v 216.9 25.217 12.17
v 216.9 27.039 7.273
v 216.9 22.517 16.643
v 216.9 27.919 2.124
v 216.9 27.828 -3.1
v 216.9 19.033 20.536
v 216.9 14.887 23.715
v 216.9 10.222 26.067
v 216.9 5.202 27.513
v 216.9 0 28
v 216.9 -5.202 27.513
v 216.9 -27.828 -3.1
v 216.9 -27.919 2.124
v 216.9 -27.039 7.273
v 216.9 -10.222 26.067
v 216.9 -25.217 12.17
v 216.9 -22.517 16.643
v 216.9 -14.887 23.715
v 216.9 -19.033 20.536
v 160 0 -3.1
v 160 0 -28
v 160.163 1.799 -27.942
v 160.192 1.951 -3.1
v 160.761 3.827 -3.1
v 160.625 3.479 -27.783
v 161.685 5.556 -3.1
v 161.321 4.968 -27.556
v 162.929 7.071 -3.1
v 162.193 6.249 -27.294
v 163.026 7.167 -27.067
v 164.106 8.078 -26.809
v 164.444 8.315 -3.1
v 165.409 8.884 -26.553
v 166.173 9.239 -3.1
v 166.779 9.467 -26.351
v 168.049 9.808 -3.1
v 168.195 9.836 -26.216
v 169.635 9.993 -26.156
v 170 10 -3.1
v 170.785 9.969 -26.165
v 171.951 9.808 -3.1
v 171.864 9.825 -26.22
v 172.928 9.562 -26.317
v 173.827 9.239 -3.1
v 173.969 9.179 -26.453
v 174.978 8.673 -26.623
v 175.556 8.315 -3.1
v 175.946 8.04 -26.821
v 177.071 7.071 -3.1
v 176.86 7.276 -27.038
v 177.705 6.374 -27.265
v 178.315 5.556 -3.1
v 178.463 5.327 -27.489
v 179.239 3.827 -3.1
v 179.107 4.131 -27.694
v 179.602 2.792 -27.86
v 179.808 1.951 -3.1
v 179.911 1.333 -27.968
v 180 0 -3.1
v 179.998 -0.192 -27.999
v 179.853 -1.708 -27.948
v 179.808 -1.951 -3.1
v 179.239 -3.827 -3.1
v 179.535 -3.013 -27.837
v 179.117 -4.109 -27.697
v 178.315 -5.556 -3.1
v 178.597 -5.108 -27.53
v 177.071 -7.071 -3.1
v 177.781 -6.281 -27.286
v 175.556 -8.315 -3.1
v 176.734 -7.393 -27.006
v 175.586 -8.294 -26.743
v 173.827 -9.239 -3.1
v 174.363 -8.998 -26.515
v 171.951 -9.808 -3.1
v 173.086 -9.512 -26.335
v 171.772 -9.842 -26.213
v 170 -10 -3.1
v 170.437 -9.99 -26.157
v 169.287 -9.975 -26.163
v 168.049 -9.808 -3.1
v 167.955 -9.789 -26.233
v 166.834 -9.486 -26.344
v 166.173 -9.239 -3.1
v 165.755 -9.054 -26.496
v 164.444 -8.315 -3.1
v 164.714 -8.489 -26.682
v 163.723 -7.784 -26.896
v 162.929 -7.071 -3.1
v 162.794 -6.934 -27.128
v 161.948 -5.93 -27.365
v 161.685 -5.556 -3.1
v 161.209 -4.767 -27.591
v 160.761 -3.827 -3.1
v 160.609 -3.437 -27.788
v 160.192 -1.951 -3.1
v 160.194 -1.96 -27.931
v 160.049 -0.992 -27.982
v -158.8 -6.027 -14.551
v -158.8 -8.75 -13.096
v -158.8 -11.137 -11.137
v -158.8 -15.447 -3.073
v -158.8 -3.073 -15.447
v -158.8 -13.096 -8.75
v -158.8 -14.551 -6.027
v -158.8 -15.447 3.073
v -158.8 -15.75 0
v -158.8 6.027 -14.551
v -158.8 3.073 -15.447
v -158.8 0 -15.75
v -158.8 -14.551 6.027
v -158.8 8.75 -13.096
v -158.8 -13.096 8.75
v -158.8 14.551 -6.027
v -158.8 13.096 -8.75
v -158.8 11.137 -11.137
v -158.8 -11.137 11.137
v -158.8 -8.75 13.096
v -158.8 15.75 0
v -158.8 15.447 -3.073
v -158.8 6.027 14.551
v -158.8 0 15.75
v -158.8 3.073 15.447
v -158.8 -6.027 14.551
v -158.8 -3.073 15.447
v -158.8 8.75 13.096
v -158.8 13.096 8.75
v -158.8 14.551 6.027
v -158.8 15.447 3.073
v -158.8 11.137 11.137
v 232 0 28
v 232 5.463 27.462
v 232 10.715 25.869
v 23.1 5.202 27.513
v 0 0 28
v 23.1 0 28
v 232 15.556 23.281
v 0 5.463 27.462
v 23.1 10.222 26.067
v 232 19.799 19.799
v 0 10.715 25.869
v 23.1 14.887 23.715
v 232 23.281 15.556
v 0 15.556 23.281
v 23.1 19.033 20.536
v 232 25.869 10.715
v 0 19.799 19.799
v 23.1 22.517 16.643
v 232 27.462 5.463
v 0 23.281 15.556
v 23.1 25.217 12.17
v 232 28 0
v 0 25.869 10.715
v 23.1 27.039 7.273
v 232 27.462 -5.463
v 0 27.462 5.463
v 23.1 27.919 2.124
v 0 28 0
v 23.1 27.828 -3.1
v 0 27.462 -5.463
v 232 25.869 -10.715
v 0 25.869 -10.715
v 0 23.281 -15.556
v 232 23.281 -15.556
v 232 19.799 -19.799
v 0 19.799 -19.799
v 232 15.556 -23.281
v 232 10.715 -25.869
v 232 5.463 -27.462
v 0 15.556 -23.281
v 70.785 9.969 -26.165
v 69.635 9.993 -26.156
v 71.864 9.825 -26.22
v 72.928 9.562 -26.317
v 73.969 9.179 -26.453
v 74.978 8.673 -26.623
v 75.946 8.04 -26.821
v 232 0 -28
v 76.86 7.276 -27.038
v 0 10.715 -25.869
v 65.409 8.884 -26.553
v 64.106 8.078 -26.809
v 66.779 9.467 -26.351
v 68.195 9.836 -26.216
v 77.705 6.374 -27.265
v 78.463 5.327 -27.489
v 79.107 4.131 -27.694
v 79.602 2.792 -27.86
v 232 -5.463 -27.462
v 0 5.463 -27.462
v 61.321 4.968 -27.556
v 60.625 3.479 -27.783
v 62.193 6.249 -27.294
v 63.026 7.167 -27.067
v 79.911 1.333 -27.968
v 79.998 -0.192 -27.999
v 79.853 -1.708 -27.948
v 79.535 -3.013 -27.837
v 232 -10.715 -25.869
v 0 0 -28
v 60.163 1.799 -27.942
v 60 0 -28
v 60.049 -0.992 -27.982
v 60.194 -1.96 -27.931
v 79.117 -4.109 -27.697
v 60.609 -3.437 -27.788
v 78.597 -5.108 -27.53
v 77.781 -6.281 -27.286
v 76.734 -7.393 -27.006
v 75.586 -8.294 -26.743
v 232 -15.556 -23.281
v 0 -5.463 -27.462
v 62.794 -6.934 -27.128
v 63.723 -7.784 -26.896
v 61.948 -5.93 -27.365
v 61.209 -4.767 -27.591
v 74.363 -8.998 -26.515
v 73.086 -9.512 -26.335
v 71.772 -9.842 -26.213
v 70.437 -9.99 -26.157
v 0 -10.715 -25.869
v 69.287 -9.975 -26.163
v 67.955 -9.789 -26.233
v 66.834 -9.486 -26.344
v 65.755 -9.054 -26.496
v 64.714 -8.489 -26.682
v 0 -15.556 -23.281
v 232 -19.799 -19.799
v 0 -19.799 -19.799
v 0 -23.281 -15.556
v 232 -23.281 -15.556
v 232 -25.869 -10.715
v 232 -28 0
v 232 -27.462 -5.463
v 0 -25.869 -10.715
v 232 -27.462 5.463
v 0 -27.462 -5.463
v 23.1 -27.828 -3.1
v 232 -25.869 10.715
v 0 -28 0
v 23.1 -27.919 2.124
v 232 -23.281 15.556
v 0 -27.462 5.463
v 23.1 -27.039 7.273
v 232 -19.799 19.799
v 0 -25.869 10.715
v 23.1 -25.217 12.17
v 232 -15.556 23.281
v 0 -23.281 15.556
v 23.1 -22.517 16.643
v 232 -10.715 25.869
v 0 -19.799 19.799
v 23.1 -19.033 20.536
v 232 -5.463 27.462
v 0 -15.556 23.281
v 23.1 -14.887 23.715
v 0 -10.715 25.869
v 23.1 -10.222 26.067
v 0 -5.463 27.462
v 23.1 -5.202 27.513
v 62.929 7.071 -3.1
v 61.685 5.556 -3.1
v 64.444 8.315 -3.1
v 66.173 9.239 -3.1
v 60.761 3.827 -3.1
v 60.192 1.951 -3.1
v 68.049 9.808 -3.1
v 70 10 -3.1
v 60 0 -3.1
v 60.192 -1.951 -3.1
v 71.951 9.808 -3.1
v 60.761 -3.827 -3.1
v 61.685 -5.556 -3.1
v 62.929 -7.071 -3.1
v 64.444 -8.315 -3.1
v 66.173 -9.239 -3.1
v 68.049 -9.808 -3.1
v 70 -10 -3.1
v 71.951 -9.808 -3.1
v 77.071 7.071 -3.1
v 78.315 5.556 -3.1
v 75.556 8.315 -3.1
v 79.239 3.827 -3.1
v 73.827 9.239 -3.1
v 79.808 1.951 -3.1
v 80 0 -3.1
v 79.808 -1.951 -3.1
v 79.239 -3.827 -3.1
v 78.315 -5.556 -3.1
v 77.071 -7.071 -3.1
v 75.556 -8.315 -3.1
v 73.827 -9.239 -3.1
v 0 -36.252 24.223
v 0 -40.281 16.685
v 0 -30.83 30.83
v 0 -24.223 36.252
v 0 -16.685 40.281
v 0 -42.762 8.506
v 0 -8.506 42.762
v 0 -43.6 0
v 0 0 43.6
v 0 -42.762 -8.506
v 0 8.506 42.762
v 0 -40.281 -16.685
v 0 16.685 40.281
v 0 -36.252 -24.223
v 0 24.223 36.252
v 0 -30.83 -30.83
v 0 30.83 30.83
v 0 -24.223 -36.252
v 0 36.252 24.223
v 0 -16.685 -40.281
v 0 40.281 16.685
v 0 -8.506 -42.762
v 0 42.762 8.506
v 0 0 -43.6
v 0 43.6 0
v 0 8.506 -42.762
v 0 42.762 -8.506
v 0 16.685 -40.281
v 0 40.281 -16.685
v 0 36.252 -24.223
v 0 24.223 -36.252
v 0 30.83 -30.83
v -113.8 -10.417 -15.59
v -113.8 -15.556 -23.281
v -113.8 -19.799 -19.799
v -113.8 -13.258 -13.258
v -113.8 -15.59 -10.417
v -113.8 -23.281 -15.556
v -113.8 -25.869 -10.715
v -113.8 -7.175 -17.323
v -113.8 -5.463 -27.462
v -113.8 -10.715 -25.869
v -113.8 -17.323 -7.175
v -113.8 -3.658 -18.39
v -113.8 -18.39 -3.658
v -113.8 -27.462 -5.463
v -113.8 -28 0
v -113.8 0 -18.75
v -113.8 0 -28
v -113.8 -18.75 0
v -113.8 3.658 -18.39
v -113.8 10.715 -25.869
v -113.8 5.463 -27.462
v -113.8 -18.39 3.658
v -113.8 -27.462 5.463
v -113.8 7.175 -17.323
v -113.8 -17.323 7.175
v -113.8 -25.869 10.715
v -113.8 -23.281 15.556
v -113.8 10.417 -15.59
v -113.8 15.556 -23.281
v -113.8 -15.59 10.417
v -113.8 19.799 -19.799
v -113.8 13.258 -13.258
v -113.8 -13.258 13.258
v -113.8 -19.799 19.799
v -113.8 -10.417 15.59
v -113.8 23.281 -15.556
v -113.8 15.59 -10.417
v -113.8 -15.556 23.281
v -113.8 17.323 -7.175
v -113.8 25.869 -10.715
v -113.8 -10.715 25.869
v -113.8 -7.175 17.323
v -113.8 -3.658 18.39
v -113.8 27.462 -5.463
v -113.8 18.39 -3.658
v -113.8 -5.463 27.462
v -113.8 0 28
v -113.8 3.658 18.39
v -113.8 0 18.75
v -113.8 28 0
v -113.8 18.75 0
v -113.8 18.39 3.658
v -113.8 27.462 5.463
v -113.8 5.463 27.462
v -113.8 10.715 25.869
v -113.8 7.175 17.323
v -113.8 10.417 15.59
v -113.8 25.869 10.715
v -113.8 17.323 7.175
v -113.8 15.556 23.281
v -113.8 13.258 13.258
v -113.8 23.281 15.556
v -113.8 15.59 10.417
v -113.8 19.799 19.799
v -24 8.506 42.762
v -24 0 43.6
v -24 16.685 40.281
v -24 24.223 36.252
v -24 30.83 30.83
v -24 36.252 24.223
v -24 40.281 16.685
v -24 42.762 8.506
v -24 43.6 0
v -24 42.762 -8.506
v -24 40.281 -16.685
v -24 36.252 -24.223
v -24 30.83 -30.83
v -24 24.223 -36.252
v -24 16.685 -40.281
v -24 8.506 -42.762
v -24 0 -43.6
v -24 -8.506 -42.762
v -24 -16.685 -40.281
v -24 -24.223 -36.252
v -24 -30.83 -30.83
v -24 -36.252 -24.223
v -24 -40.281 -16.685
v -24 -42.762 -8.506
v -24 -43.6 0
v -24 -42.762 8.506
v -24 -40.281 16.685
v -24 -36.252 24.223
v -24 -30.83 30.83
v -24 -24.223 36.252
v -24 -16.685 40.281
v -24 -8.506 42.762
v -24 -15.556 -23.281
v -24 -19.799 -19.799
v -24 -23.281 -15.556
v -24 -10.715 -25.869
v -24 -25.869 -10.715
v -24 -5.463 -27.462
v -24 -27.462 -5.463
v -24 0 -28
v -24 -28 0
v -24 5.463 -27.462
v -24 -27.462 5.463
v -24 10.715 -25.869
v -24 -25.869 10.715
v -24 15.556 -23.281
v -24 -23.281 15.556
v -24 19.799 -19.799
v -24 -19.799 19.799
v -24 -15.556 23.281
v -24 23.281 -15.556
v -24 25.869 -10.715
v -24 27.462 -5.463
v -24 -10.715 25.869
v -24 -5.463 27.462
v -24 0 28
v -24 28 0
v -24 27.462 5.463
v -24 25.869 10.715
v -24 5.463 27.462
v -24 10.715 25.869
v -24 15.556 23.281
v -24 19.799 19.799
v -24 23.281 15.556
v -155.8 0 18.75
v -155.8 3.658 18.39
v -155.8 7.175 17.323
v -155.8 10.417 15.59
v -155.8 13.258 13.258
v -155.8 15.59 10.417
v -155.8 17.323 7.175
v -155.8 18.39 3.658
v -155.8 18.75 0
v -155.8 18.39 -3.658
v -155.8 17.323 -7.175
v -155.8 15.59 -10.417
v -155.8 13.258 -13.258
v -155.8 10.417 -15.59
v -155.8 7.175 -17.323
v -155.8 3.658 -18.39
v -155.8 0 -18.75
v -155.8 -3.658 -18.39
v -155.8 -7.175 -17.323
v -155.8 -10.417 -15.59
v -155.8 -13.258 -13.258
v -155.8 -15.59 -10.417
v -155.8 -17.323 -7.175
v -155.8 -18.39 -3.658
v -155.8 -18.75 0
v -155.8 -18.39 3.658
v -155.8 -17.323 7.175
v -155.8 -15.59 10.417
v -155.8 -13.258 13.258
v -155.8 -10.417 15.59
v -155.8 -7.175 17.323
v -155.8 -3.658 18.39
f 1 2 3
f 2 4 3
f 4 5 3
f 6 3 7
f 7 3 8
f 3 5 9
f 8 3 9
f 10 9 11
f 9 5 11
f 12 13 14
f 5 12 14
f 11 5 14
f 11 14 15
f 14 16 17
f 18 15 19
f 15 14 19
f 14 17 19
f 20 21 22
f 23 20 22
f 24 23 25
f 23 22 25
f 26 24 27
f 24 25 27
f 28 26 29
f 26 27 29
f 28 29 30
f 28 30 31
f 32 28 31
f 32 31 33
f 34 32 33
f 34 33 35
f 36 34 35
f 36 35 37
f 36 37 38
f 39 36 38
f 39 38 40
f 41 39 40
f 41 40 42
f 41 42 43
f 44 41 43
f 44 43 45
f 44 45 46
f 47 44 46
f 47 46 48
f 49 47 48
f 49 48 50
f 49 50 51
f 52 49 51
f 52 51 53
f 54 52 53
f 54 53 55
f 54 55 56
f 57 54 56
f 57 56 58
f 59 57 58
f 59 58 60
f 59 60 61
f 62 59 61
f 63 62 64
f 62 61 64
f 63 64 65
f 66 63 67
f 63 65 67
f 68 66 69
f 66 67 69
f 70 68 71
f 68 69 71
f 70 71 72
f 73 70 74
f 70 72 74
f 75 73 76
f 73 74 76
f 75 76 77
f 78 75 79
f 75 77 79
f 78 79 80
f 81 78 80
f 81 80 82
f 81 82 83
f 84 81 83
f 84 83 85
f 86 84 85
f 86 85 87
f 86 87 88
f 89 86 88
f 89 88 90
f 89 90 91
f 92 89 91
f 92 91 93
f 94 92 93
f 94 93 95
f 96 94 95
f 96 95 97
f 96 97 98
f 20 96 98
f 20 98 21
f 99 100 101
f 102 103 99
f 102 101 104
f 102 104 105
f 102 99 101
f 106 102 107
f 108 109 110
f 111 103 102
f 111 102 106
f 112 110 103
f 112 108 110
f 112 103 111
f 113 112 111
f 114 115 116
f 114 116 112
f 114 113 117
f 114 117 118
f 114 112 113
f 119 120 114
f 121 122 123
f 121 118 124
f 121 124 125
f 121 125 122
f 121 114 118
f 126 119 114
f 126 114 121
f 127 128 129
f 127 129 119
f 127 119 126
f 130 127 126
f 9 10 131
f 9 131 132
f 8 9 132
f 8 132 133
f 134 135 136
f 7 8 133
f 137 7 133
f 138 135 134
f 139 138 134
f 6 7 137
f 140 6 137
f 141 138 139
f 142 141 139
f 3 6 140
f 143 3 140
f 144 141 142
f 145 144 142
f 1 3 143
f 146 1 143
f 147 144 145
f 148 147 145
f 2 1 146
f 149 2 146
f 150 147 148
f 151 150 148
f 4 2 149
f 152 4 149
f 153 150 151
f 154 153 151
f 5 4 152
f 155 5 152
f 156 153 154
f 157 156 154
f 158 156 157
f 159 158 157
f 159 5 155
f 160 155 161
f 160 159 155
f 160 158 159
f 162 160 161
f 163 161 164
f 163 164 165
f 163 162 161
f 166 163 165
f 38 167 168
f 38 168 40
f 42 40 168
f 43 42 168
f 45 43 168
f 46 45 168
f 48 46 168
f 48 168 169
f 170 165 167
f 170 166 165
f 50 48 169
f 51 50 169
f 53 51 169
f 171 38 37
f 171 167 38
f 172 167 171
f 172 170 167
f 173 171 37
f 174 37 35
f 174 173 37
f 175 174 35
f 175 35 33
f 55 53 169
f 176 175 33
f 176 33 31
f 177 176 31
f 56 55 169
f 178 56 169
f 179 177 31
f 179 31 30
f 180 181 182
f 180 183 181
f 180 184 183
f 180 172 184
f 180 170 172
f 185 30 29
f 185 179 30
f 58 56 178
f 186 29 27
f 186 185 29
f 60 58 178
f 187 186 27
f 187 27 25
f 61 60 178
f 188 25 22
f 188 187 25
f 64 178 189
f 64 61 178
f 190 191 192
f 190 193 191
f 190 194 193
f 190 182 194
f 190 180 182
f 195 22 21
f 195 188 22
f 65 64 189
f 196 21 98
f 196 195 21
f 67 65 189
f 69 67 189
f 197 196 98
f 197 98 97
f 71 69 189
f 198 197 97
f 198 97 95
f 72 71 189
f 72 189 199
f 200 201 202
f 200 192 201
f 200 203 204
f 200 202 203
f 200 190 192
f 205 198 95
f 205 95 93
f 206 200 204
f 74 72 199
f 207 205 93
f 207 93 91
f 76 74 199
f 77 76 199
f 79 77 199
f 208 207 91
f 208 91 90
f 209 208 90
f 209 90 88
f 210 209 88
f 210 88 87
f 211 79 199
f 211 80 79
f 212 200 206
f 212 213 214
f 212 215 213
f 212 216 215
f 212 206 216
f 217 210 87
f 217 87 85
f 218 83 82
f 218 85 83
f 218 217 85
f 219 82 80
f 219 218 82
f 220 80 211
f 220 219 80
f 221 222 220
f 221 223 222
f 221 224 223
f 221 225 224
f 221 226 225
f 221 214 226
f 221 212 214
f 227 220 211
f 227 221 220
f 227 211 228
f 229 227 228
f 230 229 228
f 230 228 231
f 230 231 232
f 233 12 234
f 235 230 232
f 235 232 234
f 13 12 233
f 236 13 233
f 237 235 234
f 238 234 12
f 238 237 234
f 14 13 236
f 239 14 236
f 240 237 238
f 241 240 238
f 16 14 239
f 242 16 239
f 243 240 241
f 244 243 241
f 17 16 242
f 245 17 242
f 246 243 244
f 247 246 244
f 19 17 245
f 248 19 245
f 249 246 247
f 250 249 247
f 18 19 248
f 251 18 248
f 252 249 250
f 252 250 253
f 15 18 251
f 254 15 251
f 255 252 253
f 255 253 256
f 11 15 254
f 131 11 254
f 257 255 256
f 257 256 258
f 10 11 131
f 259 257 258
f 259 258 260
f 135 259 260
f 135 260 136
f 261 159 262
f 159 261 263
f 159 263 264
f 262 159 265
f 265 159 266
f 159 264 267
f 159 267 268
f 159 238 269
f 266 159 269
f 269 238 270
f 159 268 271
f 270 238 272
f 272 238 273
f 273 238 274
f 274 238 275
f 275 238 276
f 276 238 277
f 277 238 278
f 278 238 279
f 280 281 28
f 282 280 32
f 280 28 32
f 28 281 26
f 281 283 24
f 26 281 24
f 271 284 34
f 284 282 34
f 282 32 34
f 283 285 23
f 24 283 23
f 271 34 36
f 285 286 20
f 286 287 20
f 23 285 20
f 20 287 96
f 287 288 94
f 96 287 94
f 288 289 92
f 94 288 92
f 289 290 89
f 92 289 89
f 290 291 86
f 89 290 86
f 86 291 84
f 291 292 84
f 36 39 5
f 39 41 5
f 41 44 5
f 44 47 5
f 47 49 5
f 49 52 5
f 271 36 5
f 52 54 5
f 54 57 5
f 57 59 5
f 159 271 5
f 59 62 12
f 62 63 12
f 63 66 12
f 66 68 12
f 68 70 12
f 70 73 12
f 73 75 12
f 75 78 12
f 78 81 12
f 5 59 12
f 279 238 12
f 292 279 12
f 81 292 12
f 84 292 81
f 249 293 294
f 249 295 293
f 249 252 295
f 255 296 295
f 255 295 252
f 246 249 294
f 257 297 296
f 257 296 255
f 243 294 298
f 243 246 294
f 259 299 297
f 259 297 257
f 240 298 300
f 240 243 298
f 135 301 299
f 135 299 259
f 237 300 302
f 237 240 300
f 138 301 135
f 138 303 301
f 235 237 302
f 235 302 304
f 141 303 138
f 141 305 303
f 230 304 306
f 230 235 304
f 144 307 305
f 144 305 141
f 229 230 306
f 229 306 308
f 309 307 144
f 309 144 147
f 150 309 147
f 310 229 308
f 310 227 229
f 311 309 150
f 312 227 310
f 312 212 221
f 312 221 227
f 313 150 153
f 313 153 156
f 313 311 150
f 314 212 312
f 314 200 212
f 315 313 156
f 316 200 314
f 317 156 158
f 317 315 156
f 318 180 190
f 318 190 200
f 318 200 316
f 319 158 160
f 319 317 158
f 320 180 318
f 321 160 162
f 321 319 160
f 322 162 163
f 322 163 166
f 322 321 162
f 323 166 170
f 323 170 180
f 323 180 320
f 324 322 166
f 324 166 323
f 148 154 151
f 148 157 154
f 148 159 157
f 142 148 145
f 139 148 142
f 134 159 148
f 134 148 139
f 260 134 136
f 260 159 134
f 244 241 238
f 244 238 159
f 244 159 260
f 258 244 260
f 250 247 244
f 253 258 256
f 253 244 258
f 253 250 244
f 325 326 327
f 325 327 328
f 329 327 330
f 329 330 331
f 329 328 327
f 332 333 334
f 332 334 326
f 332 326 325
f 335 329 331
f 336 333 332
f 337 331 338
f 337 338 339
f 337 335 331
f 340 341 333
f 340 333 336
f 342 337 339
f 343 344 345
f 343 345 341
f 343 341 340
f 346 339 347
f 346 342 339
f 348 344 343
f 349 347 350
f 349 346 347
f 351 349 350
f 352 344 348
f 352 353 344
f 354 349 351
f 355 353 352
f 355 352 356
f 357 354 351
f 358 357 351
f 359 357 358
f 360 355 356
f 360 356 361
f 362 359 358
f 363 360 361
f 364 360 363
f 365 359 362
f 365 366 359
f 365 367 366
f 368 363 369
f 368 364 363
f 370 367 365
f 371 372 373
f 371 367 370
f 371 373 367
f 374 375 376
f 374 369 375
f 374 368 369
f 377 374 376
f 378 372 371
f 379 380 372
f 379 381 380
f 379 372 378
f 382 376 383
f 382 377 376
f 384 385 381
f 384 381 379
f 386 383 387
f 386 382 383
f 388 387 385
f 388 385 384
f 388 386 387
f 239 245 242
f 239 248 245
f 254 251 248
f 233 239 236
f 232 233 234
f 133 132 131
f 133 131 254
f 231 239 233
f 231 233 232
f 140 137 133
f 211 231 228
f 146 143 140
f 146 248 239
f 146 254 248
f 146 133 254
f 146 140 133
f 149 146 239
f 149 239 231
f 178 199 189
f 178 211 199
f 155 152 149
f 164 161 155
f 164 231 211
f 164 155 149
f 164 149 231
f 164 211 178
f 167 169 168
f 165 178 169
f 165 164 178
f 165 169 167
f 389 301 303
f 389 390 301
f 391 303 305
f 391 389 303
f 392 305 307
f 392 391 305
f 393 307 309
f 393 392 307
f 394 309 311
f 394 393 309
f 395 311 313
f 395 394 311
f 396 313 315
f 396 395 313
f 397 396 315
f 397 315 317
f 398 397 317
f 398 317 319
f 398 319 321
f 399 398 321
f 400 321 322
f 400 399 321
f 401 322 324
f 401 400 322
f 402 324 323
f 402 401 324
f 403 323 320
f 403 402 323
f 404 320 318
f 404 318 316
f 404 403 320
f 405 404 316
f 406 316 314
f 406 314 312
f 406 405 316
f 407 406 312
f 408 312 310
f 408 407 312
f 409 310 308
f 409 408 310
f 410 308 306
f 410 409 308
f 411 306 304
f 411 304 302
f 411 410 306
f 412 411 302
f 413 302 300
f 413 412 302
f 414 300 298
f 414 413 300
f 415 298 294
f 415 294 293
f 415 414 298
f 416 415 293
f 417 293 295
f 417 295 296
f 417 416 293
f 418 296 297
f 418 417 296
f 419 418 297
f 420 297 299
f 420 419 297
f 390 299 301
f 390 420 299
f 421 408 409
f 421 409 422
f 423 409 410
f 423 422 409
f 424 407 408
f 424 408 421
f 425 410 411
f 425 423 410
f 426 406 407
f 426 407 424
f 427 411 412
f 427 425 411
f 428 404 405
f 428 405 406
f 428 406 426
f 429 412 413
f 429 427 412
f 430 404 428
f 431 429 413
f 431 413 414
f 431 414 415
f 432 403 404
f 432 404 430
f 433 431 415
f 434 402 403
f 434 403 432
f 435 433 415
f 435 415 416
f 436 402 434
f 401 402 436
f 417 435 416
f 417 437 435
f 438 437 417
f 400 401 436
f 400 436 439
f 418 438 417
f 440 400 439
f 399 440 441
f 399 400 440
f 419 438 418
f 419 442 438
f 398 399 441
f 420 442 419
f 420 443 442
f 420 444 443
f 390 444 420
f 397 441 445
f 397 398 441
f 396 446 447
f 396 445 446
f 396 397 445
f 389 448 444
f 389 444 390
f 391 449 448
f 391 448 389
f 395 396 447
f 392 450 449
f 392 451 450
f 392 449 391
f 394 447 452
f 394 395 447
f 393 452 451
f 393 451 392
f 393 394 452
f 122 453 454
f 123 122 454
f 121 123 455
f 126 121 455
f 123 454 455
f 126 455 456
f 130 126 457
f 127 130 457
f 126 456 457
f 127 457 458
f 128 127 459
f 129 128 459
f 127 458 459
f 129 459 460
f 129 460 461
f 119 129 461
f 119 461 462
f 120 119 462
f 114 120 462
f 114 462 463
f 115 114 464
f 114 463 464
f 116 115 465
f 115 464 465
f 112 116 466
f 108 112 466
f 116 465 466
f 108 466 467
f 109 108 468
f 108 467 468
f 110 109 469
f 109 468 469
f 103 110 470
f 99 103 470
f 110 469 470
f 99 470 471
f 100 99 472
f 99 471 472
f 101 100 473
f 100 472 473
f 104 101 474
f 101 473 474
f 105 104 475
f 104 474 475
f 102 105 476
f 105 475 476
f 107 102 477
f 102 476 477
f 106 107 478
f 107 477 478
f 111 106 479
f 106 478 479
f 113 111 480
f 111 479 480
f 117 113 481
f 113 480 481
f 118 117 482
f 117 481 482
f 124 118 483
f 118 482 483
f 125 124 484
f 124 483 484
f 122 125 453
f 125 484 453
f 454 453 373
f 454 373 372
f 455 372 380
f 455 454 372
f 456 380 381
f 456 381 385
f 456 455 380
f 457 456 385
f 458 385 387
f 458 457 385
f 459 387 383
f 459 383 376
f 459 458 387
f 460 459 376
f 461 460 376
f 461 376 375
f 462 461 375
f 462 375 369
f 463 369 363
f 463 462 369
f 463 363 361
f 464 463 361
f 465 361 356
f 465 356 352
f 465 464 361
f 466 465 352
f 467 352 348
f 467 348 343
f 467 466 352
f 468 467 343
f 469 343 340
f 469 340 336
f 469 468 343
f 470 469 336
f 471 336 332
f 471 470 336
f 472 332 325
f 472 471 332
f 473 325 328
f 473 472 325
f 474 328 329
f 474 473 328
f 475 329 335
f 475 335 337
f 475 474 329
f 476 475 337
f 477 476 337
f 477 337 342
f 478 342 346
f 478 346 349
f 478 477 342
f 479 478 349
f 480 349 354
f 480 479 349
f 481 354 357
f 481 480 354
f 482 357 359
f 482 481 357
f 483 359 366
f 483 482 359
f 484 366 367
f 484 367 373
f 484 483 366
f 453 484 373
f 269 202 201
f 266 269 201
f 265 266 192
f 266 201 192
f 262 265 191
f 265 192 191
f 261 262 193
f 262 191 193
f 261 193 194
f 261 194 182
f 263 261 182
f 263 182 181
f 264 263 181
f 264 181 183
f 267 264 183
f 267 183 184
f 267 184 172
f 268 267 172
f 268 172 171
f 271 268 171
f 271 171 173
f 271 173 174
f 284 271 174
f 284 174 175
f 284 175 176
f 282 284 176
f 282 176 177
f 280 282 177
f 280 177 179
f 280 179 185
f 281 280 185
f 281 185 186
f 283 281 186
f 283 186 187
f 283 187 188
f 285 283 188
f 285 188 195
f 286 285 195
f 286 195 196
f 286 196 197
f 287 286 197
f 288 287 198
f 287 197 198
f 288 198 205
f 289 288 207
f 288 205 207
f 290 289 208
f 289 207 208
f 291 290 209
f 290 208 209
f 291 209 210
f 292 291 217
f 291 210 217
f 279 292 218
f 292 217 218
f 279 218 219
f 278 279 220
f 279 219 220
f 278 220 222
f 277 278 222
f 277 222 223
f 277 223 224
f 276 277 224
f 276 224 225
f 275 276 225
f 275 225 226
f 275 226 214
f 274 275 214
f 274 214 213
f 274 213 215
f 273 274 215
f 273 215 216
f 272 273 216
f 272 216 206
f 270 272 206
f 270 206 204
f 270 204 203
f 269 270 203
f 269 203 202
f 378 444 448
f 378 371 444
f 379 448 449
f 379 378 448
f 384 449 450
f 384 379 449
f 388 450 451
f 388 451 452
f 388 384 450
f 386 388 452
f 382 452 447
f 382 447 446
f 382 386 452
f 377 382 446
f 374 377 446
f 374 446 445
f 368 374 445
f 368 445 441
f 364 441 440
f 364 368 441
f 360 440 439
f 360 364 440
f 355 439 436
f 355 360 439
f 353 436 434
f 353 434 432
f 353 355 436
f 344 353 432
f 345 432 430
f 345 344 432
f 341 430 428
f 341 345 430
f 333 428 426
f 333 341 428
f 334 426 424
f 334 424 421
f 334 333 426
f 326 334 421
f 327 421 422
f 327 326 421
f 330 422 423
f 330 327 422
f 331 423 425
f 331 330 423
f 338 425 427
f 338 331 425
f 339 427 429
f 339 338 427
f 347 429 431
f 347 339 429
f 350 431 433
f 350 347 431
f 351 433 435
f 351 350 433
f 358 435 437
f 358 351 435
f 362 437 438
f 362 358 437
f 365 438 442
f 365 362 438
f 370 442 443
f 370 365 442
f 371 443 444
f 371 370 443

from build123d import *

# Parameters (mm, degrees)
F2_W          = 193.8
F2_H          = 44.1753827035
F3_DEPTH      = 43.601
F3_DEPTH_BACK = 43.601
F5_D          = 20
F6_SIZE       = 3


with BuildPart() as f1:
    # F0 (on Front) → F1 (revolve)
    with BuildSketch(Plane.XZ):
        Polygon((-158.8, 18.75), (-158.8, 0), (232, 0), (232, 28), (0, 28), (0, 43.6), (-24, 43.6), (-24, 28), (-113.8, 28), (-113.8, 18.75), align=None)
    revolve(axis=Axis((36.6, 0, 0), (-1, 0, 0)))

    # F2 (on Front) → F3 (cut, two sides)
    with BuildSketch(Plane.XZ) as f3_sk:
        with Locations((120, 18.9876913518)):
            Rectangle(F2_W, F2_H)
    extrude(amount=-F3_DEPTH, mode=Mode.SUBTRACT)
    extrude(f3_sk.sketch, amount=F3_DEPTH_BACK, mode=Mode.SUBTRACT)

    # F5 (through all)
    with Locations(Plane.XY.offset(-3.1)):
        with Locations((70, 0), (170, 0)):
            Hole(F5_D / 2)

    # F6
    f6_edges = [f1.edges().sort_by_distance(p)[0] for p in [
        (-158.8, 0, -18.75),
    ]]
    chamfer(f6_edges, length=F6_SIZE)


solid = f1.part
